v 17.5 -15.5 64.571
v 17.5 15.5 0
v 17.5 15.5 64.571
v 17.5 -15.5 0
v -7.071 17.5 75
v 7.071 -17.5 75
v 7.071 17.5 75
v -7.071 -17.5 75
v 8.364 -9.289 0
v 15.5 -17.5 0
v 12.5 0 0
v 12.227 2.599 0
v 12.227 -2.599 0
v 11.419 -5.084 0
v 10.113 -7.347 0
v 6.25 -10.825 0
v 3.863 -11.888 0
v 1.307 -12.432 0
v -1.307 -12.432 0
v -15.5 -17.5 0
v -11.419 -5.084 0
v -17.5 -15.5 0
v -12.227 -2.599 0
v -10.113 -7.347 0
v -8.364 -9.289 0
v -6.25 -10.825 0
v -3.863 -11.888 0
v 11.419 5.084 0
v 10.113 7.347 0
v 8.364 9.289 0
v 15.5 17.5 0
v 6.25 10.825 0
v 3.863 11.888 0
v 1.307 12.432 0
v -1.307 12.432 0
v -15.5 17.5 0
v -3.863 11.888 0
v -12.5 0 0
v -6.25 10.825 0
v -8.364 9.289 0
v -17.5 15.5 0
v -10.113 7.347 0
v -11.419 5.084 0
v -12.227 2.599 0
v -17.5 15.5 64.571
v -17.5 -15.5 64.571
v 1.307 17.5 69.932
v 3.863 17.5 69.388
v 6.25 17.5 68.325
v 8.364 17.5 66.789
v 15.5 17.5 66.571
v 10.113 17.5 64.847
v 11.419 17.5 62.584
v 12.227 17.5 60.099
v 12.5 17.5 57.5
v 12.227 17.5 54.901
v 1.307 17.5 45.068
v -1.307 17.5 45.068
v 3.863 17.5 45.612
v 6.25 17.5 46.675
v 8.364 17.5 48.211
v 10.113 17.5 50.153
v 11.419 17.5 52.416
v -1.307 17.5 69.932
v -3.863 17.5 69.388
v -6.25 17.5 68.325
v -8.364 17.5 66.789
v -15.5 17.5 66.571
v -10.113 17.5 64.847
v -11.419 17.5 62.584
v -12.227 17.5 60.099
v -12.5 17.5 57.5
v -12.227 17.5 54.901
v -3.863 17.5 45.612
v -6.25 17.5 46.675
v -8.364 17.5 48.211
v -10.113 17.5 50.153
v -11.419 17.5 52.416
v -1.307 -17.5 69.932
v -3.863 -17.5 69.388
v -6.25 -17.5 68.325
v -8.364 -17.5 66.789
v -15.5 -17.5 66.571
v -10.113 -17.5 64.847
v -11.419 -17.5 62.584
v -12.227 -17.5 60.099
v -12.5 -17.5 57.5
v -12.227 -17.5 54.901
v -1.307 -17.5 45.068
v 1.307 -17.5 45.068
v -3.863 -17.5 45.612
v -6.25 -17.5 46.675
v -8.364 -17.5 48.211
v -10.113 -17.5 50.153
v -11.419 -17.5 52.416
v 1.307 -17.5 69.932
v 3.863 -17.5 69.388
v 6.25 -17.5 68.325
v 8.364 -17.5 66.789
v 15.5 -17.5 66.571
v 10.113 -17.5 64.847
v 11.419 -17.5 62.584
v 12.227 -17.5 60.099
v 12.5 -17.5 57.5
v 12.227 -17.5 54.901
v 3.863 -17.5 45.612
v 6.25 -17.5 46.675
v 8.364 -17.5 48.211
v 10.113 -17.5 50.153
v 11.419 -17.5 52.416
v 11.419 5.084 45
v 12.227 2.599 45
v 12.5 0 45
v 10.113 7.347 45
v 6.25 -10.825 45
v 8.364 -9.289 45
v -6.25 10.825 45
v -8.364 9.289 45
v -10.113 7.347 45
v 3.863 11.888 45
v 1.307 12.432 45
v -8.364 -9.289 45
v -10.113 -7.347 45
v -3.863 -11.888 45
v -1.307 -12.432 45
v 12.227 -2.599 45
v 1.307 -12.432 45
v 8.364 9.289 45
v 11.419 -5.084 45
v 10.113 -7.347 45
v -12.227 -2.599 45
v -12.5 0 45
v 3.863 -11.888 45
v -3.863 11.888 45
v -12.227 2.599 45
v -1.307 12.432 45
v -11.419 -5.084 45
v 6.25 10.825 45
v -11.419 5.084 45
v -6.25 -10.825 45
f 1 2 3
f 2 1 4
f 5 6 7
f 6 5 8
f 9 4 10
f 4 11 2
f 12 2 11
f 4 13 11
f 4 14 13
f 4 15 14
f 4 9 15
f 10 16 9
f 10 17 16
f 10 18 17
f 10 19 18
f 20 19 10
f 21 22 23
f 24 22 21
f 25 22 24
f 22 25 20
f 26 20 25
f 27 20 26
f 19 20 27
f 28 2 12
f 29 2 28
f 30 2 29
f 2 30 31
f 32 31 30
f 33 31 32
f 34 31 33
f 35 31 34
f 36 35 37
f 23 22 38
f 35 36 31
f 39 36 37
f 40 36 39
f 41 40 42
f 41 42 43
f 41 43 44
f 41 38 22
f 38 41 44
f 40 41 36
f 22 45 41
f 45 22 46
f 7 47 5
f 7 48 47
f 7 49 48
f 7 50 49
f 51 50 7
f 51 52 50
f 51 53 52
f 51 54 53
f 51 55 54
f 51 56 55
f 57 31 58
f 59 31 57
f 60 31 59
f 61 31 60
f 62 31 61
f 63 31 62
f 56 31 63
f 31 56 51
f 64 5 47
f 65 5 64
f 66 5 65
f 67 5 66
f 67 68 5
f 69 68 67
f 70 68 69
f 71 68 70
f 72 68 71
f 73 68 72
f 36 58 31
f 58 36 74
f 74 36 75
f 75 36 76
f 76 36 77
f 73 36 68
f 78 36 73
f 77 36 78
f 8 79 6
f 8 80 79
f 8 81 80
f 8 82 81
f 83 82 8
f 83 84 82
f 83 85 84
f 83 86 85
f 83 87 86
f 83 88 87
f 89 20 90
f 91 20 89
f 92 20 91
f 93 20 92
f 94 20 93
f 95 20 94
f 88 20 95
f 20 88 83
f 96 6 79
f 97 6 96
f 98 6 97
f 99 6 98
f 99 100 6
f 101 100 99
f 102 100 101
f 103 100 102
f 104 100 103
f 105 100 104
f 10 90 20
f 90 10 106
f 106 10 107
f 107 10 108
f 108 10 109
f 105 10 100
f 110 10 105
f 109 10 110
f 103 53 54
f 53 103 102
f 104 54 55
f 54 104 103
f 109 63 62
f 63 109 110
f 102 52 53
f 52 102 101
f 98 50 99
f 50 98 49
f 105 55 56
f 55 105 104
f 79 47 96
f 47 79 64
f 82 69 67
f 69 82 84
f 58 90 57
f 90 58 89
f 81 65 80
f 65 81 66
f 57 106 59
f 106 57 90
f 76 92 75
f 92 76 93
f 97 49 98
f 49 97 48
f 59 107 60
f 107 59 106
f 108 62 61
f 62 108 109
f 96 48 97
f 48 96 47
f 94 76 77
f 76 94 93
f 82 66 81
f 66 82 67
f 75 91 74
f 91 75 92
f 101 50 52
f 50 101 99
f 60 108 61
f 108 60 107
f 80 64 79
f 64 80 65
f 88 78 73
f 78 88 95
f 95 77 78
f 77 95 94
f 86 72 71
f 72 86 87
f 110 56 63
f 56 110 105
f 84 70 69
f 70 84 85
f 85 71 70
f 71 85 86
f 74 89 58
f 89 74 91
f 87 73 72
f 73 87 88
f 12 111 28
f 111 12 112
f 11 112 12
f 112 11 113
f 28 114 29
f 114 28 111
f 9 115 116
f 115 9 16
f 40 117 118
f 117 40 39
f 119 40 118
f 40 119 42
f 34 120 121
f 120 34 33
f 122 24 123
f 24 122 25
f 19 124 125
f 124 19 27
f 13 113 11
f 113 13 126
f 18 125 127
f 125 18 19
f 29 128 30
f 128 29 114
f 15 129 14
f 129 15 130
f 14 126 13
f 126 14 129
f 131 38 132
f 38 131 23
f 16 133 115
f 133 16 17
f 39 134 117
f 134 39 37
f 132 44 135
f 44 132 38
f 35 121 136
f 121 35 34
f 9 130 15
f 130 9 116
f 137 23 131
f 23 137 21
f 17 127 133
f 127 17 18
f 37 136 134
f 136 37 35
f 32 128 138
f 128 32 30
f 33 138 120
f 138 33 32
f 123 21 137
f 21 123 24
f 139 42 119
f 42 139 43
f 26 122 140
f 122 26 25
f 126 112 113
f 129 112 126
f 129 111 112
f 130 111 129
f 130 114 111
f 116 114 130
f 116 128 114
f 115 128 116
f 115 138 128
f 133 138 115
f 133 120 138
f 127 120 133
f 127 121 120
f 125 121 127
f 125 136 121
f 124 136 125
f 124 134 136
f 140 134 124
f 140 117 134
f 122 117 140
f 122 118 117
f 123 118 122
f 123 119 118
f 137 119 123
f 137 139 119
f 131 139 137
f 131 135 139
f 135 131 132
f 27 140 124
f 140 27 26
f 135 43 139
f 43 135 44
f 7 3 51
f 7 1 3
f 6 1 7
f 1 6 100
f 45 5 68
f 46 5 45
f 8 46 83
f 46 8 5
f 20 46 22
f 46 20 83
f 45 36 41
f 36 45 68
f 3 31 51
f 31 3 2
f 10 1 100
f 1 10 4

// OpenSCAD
// file: Parameters.scad
//Main tube diameter [mm]
main_tube_outer_diameter = 25;
main_tube_inner_diameter = 21;

//Tube for undercarriage [mm]
tube_for_undercarriage_outer_diameter = 10;
tube_for_undercarriage_inner_diameter = 5;

//Screw diameter in model 666_1019 [mm]
M4_screw_diameter=4;
// main file
include <./Parameters.scad>

wall_thickness=main_tube_outer_diameter/5;
width=main_tube_outer_diameter+2*wall_thickness;
depth=width;
height=main_tube_outer_diameter*1.8+main_tube_outer_diameter+wall_thickness;
radius=main_tube_outer_diameter/2;


difference () {
	translate([-(width/2),-(width/2),0])
	cube ([width,depth,height]);

	translate([0,radius+wall_thickness,main_tube_outer_diameter*1.8+radius])
    rotate([90,0,0])
    cylinder(h=width,r1=radius,r2=radius);

   cylinder(h=main_tube_outer_diameter*1.8,r1=radius,r2=radius);

   translate([0,-(depth/2),height+sqrt(2)*wall_thickness])
   rotate([0,45,0])
   cube([width,width,width]);

   translate([-width/2-(sqrt(2)*wall_thickness),-(depth/2),height-wall_thickness-radius])
   rotate([0,-45,0])
   cube([width,width,width]);

   translate([-width+2,0,0])
   rotate([0,0,225])
   cube([height,height,height]);

   translate([-width+2,0,0])
   rotate([0,0,45])
   cube([height,height,height]);

   translate([+width-2,0,0])
   rotate([0,0,45])
   cube([height,height,height]);

   translate([0,-width+2,0])
   rotate([0,0,-45])
   cube([height,height,height]);


   }    
